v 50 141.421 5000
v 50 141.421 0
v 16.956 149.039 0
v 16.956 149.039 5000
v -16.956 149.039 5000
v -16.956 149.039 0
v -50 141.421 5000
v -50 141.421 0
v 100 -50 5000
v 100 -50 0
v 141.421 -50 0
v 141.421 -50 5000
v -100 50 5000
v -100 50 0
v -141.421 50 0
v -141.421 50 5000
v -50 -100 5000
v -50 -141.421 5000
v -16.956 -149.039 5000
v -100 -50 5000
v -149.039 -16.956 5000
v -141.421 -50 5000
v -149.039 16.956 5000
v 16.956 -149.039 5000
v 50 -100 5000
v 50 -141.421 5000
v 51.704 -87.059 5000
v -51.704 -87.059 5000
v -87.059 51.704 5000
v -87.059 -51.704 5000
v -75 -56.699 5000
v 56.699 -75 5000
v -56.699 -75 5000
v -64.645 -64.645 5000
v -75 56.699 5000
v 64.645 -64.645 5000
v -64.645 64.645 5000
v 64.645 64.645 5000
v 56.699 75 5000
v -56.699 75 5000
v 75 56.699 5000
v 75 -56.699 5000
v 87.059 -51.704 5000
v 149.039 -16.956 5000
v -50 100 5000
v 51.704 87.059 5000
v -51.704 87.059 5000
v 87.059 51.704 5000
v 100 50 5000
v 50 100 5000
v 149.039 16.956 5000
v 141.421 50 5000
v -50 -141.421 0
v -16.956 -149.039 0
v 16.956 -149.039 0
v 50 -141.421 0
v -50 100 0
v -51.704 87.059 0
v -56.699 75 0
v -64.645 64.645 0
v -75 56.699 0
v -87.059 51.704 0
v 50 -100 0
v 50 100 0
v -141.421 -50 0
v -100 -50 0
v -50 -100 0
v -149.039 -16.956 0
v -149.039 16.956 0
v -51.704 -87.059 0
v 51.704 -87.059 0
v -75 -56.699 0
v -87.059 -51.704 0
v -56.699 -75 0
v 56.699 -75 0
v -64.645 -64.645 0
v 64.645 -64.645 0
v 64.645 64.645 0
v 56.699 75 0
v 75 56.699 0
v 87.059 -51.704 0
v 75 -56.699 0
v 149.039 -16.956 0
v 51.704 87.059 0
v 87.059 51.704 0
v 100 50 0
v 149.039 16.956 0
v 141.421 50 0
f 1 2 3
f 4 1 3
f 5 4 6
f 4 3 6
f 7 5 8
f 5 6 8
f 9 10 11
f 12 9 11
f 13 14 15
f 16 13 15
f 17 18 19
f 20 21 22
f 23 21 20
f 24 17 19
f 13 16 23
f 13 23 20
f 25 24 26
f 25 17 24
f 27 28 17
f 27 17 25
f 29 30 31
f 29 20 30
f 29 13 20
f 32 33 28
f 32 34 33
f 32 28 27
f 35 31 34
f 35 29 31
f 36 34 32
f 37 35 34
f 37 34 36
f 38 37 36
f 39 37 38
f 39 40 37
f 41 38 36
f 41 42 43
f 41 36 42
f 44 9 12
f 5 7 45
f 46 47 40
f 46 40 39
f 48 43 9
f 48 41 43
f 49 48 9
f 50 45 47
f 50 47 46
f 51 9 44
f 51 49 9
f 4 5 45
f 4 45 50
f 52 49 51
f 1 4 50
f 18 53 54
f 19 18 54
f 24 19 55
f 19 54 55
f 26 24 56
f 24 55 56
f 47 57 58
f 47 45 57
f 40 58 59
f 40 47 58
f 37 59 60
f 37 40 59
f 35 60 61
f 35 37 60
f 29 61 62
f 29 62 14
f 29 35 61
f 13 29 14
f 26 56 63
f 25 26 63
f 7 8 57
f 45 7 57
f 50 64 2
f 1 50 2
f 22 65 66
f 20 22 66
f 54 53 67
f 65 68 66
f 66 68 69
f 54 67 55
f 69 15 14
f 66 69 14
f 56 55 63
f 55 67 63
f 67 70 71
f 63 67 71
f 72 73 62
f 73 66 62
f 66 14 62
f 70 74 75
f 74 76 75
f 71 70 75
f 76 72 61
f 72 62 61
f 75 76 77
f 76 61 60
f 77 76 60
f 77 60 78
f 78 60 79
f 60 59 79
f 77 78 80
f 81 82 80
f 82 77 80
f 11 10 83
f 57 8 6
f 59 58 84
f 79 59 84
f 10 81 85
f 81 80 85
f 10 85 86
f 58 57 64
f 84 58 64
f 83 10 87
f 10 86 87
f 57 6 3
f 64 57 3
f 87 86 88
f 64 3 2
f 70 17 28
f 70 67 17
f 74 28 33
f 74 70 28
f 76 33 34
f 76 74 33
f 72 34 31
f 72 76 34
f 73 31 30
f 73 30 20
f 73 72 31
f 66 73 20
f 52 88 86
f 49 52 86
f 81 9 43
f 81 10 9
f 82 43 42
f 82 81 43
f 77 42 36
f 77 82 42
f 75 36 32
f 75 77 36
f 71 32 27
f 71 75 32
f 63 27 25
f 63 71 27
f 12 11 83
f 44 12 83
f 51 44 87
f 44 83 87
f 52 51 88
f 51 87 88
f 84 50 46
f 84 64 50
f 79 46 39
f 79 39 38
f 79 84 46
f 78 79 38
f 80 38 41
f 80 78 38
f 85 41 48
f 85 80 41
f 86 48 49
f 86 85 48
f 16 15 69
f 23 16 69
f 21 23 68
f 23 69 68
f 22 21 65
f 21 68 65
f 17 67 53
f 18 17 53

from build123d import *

# Parameters (mm, degrees)
BOSS_EXTRUDE1_DEPTH = 5000
CIRPATTERN1_COUNT   = 4
FILLET1_R           = 50


with BuildPart() as part:
    # Sketch1 → Boss-Extrude1 (new body)
    with BuildSketch(Plane(origin=(0, 0, 0), x_dir=(0, 1, 0), z_dir=(0, 0, 1))):
        with BuildLine():
            Line((-50, 141.421356237), (-50, 0))
            Line((-50, 0), (50, 0))
            Line((50, 0), (50, 141.421356237))
            ThreePointArc((50, 141.421356237), (0, 150), (-50, 141.421356237))
        make_face()
    extrude(amount=BOSS_EXTRUDE1_DEPTH)


with BuildPart() as cirpattern1_1:
    # CirPattern1: pattern copy
    add(part.part.rotate(Axis((0, 0, -10), (0, 0, 1)), 1 * 360 / CIRPATTERN1_COUNT))


with BuildPart() as cirpattern1_2:
    # CirPattern1: pattern copy
    add(part.part.rotate(Axis((0, 0, -10), (0, 0, 1)), 2 * 360 / CIRPATTERN1_COUNT))


with BuildPart() as cirpattern1_3:
    # CirPattern1: pattern copy
    add(part.part.rotate(Axis((0, 0, -10), (0, 0, 1)), 3 * 360 / CIRPATTERN1_COUNT))


with BuildPart() as part_1:
    add(part.part)

    # Combine1: union CirPattern1_1, CirPattern1_2, CirPattern1_3
    add(cirpattern1_1.part)
    add(cirpattern1_2.part)
    add(cirpattern1_3.part)

    # Fillet1
    fillet1_edges = [part_1.edges().sort_by_distance(p)[0] for p in [
        (50, 50, 2500),
        (50, -50, 2500),
        (-50, 50, 2500),
        (-50, -50, 2500),
    ]]
    fillet(fillet1_edges, radius=FILLET1_R)


solid = part_1.part
